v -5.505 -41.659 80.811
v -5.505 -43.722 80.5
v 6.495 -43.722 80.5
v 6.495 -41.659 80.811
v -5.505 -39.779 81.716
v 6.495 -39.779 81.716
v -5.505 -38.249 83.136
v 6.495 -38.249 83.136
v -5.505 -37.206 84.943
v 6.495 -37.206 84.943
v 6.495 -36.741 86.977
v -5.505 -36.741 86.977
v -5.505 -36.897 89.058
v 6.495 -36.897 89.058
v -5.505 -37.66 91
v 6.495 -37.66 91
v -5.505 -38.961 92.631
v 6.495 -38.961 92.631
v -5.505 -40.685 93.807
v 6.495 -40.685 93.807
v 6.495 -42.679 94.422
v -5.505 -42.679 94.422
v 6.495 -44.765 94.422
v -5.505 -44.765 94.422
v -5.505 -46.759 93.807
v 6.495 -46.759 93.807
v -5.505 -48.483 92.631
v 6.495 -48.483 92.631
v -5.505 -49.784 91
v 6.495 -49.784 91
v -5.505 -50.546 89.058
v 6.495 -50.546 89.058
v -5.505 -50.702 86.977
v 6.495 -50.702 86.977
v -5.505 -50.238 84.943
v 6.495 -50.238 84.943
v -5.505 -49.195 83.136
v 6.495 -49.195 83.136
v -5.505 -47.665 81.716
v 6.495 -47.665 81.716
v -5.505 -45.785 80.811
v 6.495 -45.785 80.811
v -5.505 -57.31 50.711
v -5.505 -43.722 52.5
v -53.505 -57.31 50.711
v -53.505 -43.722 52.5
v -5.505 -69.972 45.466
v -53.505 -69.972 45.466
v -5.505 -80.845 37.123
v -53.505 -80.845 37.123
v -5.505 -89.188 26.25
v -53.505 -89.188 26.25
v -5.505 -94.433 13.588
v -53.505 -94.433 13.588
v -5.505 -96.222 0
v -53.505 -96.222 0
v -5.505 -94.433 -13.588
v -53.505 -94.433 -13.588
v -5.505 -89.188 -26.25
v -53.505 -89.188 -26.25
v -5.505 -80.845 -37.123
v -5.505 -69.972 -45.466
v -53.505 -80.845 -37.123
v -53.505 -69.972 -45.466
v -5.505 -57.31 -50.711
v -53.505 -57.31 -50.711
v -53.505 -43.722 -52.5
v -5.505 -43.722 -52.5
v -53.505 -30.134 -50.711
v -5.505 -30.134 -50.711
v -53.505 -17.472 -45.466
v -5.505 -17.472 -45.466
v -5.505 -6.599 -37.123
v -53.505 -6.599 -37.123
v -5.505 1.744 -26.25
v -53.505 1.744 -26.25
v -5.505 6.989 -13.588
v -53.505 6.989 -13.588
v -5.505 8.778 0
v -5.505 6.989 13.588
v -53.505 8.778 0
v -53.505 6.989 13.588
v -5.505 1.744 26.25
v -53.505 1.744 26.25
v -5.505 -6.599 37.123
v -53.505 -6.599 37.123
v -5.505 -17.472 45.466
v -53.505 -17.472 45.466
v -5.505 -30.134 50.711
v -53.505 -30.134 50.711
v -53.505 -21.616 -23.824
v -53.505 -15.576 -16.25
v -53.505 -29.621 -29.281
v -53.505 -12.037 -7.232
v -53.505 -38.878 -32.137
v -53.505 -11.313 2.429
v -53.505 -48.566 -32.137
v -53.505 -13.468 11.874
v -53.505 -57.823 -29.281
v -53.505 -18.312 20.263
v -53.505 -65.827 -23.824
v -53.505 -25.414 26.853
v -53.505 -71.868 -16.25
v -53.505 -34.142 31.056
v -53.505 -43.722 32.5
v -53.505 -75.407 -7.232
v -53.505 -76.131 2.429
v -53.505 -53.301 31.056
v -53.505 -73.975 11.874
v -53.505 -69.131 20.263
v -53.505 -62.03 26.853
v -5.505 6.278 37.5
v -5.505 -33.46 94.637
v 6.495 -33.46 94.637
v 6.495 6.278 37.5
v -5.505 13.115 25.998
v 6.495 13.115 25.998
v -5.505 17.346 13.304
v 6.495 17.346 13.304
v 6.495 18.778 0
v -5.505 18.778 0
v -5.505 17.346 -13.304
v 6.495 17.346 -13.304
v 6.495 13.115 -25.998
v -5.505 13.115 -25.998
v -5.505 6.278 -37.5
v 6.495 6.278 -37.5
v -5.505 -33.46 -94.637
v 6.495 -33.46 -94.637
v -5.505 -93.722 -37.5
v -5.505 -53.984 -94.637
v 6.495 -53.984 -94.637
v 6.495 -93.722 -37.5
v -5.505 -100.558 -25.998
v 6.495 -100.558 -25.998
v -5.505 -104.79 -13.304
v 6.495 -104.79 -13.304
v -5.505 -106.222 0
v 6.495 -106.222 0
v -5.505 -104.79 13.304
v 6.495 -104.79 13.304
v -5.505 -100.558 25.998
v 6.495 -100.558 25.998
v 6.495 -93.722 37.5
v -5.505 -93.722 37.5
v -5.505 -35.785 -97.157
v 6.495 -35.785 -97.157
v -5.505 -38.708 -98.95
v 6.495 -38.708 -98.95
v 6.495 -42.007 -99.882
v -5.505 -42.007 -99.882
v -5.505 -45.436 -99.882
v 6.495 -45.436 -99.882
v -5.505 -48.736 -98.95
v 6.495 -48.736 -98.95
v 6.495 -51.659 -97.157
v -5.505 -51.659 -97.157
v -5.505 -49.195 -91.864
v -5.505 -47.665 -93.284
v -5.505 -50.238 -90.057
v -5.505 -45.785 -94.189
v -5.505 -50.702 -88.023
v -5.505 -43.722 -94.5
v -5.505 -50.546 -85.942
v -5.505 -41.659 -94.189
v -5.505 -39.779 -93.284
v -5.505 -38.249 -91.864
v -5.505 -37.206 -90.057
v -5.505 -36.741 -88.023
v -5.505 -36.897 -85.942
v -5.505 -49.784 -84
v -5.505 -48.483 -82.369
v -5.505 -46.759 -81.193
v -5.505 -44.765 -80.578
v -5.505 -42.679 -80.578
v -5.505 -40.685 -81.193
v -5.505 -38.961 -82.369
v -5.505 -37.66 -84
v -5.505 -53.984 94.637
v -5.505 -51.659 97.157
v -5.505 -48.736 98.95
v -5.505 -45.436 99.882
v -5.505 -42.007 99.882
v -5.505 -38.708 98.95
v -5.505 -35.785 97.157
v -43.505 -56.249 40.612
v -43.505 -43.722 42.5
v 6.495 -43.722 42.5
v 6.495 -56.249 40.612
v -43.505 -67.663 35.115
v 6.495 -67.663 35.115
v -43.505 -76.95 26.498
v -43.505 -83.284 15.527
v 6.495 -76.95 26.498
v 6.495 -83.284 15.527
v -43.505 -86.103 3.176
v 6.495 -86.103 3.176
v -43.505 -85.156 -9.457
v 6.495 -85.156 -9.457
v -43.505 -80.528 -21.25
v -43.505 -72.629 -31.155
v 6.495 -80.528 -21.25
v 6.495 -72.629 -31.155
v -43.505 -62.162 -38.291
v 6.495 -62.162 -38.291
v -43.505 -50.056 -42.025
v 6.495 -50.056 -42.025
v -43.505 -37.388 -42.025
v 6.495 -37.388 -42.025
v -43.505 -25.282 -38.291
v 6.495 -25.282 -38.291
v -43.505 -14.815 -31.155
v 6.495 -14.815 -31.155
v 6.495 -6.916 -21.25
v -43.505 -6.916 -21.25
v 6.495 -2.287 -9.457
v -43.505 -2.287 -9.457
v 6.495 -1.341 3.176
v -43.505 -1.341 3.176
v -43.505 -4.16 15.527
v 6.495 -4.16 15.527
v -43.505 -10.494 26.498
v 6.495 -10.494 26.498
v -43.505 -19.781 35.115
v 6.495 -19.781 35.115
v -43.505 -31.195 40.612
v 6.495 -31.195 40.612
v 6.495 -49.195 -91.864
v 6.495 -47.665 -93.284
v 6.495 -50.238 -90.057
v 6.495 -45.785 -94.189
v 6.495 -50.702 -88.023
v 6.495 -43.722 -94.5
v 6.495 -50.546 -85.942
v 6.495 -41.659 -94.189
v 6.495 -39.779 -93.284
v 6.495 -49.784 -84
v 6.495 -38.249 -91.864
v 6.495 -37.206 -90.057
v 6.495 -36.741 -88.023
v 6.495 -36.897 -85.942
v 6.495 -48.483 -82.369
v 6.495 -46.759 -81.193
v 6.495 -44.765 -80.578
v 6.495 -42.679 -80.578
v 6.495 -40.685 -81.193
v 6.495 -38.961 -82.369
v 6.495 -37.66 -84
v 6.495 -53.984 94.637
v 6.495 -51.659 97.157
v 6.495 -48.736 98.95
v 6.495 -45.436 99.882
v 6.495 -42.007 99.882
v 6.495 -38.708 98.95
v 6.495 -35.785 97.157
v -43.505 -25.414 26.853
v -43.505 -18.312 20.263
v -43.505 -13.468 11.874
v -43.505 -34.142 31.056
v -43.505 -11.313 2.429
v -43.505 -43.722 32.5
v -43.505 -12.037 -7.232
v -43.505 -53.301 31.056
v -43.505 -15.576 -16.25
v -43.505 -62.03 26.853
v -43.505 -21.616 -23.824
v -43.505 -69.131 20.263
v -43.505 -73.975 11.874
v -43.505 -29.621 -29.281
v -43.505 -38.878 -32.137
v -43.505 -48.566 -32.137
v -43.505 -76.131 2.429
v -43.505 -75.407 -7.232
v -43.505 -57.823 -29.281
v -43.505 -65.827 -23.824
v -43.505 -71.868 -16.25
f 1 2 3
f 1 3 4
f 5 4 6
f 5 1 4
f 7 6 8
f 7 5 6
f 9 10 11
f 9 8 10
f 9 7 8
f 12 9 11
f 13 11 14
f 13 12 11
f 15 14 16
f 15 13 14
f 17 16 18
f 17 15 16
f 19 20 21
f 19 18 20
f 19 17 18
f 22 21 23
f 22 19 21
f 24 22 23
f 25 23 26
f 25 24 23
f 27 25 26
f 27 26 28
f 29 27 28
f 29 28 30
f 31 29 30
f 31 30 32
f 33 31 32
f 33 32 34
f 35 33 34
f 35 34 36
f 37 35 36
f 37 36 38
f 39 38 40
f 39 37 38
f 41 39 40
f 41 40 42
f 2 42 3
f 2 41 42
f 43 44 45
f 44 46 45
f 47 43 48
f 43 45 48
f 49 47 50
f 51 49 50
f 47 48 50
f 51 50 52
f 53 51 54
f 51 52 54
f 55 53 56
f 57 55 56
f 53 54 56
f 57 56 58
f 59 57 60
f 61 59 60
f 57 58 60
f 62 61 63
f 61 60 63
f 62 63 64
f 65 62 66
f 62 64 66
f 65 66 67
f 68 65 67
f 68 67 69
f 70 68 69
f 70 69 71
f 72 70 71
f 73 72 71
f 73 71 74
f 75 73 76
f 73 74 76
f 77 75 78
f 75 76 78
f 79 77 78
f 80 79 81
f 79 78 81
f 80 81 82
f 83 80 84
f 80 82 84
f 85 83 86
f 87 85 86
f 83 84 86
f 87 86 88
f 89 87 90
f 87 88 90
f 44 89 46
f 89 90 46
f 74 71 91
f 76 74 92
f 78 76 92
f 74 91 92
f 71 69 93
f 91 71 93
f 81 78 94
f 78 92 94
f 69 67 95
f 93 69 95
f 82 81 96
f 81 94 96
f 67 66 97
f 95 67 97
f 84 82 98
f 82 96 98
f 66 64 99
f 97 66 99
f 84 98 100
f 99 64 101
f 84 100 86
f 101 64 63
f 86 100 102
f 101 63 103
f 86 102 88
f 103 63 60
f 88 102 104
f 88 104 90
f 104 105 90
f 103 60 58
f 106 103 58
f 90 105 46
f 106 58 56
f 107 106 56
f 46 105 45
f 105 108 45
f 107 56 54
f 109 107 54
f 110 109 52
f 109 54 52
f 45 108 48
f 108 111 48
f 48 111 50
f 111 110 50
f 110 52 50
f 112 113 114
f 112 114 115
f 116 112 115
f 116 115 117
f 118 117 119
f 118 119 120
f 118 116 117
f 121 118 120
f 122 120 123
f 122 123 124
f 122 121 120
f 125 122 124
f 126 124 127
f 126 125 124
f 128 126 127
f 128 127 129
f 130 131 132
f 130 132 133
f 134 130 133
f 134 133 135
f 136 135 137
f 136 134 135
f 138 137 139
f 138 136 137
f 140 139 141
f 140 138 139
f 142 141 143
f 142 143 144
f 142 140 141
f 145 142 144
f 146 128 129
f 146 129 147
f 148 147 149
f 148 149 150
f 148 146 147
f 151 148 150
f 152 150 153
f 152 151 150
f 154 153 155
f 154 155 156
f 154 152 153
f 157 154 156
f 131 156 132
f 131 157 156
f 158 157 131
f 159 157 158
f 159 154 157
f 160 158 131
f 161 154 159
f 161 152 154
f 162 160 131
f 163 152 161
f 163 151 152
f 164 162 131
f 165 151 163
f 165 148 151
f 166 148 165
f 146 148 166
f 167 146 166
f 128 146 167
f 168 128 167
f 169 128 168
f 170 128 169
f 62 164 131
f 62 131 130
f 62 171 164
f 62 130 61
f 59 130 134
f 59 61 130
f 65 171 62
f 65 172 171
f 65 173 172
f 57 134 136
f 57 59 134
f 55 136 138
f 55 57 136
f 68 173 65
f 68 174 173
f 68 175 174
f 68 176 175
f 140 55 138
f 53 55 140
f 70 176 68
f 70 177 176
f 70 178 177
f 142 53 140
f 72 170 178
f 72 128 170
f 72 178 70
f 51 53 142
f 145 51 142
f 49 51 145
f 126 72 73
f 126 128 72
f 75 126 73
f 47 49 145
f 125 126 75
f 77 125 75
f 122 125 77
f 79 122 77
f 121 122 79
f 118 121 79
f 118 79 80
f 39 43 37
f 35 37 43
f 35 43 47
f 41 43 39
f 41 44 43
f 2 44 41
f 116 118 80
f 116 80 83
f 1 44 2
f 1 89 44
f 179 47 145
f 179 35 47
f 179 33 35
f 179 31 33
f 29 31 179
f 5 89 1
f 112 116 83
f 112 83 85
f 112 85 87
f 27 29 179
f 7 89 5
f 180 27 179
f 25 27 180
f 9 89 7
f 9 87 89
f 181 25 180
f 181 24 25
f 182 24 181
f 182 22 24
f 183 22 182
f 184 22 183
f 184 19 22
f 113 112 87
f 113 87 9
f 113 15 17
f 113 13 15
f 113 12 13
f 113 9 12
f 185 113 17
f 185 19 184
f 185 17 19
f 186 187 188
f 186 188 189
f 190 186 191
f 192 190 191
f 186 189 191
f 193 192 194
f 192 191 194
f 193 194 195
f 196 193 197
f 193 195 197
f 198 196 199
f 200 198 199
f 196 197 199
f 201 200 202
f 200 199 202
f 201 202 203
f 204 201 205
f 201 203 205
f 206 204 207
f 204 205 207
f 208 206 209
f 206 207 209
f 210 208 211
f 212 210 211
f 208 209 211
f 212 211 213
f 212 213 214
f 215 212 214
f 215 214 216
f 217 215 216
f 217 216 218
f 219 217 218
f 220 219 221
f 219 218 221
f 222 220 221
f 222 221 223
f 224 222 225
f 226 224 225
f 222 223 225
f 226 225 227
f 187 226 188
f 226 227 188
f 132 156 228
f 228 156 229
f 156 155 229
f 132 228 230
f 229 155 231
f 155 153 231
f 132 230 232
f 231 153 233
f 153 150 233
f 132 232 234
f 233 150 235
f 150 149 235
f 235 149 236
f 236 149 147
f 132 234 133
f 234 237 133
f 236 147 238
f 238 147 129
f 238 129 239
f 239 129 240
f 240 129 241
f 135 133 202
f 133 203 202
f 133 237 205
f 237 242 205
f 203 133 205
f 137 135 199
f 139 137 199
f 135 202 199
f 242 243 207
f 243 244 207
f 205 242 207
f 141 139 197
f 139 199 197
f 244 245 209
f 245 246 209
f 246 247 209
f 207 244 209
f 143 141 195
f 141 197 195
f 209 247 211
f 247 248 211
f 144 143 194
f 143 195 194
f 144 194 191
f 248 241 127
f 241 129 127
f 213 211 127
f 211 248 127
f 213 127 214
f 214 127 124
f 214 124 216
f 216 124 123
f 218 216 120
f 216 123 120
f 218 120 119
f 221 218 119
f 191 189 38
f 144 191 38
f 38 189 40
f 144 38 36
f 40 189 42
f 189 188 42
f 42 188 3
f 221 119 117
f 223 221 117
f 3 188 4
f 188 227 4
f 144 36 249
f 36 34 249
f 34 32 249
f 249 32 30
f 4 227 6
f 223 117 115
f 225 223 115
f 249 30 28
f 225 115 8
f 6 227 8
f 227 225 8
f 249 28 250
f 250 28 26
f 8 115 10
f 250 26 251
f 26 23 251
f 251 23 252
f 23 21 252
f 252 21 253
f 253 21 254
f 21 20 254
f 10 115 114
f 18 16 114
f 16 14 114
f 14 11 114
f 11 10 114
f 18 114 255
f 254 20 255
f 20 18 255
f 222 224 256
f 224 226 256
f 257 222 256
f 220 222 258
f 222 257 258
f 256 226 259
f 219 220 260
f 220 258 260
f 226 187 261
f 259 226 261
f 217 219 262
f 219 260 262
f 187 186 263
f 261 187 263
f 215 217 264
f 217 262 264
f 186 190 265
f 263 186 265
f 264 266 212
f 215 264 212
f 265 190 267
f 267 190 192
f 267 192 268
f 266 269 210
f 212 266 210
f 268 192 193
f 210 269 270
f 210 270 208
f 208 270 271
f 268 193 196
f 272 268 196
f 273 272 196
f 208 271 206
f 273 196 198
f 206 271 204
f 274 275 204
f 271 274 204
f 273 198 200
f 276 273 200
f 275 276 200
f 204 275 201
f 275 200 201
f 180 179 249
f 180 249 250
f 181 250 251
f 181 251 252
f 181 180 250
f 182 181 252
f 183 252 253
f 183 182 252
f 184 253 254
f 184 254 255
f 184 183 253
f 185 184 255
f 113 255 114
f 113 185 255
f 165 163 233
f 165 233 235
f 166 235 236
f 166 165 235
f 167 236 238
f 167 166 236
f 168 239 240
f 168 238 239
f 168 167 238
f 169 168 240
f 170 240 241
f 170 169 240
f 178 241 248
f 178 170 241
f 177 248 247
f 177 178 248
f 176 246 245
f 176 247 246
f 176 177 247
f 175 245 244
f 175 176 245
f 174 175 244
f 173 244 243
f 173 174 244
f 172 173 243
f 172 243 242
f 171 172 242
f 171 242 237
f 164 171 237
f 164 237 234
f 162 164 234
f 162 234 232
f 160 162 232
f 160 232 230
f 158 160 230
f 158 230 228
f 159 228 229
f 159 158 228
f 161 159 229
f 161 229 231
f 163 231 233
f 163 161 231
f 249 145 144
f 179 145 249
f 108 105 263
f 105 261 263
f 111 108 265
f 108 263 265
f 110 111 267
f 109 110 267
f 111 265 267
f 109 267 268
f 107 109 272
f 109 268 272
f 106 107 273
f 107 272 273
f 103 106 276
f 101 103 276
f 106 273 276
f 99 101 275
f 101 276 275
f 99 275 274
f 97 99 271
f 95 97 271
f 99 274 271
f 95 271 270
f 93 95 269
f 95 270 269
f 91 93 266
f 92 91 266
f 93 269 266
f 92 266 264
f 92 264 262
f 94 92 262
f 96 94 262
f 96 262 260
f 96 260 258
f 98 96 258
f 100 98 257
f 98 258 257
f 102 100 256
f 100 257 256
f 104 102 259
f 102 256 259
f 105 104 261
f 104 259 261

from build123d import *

# Parameters (mm, degrees)
BOSS_EXTRUDE1_START     = -12
SKETCH2_R               = 52.5
BOSS_EXTRUDE1_DEPTH     = 12
CUT_EXTRUDE1_DEPTH      = 158.743730759
CUT_EXTRUDE1_DEPTH_BACK = 158.743730759
SKETCH3_R               = 7


with BuildPart() as part:
    # Sketch1 → Revolve1 (revolve)
    with BuildSketch(Plane.XY, mode=Mode.PRIVATE) as revolve1_sk:
        Polygon((-43.504823151, -1.221864952), (6.495176849, -1.221864952), (6.495176849, 8.778135048), (-53.504823151, 8.778135048), (-53.504823151, -11.221864952), (-43.504823151, -11.221864952), align=None)
    revolve(revolve1_sk.sketch.rotate(Axis((-50.064308682, -43.721864952, 0), (1, 0, 0)), 90), axis=Axis((-50.064308682, -43.721864952, 0), (1, 0, 0)))

    # Sketch2 → Boss-Extrude1 (add)
    with BuildSketch(Plane(origin=(6.495176849, 0, 0), x_dir=(0, 0, -1), z_dir=(1, 0, 0)).offset(BOSS_EXTRUDE1_START)):
        with BuildLine():
            Line((-37.500000001, -93.721864951), (-94.637131817, -53.983996769))
            ThreePointArc((-94.637131817, -53.983996769), (-100, -43.721864952), (-94.637131817, -33.459733135))
            Line((-94.637131817, -33.459733135), (-37.500000001, 6.278135048))
            ThreePointArc((-37.500000001, 6.278135048), (0, 18.778135048), (37.500000001, 6.278135048))
            Line((37.500000001, 6.278135048), (94.637131817, -33.459733135))
            ThreePointArc((94.637131817, -33.459733135), (100, -43.721864952), (94.637131817, -53.983996769))
            Line((94.637131817, -53.983996769), (37.500000001, -93.721864951))
            ThreePointArc((37.500000001, -93.721864951), (0, -106.221864952), (-37.500000001, -93.721864951))
        make_face()
        with Locations(Location((0, -43.721864952, 0), (0, 0, 180))):
            Circle(SKETCH2_R, mode=Mode.SUBTRACT)
    extrude(amount=BOSS_EXTRUDE1_DEPTH)

    # Sketch3 → Cut-Extrude1 (cut, two sides: drawn at the far end of the back side and taken through both)
    with BuildSketch(Plane(origin=(6.495176849, 0, 0), x_dir=(0, 0, -1), z_dir=(1, 0, 0)).offset(-CUT_EXTRUDE1_DEPTH_BACK)):
        with Locations((87.5, -43.721864952)):
            Circle(SKETCH3_R)
        with Locations((-87.5, -43.721864952)):
            Circle(SKETCH3_R)
    extrude(amount=CUT_EXTRUDE1_DEPTH + CUT_EXTRUDE1_DEPTH_BACK, mode=Mode.SUBTRACT)


solid = part.part
